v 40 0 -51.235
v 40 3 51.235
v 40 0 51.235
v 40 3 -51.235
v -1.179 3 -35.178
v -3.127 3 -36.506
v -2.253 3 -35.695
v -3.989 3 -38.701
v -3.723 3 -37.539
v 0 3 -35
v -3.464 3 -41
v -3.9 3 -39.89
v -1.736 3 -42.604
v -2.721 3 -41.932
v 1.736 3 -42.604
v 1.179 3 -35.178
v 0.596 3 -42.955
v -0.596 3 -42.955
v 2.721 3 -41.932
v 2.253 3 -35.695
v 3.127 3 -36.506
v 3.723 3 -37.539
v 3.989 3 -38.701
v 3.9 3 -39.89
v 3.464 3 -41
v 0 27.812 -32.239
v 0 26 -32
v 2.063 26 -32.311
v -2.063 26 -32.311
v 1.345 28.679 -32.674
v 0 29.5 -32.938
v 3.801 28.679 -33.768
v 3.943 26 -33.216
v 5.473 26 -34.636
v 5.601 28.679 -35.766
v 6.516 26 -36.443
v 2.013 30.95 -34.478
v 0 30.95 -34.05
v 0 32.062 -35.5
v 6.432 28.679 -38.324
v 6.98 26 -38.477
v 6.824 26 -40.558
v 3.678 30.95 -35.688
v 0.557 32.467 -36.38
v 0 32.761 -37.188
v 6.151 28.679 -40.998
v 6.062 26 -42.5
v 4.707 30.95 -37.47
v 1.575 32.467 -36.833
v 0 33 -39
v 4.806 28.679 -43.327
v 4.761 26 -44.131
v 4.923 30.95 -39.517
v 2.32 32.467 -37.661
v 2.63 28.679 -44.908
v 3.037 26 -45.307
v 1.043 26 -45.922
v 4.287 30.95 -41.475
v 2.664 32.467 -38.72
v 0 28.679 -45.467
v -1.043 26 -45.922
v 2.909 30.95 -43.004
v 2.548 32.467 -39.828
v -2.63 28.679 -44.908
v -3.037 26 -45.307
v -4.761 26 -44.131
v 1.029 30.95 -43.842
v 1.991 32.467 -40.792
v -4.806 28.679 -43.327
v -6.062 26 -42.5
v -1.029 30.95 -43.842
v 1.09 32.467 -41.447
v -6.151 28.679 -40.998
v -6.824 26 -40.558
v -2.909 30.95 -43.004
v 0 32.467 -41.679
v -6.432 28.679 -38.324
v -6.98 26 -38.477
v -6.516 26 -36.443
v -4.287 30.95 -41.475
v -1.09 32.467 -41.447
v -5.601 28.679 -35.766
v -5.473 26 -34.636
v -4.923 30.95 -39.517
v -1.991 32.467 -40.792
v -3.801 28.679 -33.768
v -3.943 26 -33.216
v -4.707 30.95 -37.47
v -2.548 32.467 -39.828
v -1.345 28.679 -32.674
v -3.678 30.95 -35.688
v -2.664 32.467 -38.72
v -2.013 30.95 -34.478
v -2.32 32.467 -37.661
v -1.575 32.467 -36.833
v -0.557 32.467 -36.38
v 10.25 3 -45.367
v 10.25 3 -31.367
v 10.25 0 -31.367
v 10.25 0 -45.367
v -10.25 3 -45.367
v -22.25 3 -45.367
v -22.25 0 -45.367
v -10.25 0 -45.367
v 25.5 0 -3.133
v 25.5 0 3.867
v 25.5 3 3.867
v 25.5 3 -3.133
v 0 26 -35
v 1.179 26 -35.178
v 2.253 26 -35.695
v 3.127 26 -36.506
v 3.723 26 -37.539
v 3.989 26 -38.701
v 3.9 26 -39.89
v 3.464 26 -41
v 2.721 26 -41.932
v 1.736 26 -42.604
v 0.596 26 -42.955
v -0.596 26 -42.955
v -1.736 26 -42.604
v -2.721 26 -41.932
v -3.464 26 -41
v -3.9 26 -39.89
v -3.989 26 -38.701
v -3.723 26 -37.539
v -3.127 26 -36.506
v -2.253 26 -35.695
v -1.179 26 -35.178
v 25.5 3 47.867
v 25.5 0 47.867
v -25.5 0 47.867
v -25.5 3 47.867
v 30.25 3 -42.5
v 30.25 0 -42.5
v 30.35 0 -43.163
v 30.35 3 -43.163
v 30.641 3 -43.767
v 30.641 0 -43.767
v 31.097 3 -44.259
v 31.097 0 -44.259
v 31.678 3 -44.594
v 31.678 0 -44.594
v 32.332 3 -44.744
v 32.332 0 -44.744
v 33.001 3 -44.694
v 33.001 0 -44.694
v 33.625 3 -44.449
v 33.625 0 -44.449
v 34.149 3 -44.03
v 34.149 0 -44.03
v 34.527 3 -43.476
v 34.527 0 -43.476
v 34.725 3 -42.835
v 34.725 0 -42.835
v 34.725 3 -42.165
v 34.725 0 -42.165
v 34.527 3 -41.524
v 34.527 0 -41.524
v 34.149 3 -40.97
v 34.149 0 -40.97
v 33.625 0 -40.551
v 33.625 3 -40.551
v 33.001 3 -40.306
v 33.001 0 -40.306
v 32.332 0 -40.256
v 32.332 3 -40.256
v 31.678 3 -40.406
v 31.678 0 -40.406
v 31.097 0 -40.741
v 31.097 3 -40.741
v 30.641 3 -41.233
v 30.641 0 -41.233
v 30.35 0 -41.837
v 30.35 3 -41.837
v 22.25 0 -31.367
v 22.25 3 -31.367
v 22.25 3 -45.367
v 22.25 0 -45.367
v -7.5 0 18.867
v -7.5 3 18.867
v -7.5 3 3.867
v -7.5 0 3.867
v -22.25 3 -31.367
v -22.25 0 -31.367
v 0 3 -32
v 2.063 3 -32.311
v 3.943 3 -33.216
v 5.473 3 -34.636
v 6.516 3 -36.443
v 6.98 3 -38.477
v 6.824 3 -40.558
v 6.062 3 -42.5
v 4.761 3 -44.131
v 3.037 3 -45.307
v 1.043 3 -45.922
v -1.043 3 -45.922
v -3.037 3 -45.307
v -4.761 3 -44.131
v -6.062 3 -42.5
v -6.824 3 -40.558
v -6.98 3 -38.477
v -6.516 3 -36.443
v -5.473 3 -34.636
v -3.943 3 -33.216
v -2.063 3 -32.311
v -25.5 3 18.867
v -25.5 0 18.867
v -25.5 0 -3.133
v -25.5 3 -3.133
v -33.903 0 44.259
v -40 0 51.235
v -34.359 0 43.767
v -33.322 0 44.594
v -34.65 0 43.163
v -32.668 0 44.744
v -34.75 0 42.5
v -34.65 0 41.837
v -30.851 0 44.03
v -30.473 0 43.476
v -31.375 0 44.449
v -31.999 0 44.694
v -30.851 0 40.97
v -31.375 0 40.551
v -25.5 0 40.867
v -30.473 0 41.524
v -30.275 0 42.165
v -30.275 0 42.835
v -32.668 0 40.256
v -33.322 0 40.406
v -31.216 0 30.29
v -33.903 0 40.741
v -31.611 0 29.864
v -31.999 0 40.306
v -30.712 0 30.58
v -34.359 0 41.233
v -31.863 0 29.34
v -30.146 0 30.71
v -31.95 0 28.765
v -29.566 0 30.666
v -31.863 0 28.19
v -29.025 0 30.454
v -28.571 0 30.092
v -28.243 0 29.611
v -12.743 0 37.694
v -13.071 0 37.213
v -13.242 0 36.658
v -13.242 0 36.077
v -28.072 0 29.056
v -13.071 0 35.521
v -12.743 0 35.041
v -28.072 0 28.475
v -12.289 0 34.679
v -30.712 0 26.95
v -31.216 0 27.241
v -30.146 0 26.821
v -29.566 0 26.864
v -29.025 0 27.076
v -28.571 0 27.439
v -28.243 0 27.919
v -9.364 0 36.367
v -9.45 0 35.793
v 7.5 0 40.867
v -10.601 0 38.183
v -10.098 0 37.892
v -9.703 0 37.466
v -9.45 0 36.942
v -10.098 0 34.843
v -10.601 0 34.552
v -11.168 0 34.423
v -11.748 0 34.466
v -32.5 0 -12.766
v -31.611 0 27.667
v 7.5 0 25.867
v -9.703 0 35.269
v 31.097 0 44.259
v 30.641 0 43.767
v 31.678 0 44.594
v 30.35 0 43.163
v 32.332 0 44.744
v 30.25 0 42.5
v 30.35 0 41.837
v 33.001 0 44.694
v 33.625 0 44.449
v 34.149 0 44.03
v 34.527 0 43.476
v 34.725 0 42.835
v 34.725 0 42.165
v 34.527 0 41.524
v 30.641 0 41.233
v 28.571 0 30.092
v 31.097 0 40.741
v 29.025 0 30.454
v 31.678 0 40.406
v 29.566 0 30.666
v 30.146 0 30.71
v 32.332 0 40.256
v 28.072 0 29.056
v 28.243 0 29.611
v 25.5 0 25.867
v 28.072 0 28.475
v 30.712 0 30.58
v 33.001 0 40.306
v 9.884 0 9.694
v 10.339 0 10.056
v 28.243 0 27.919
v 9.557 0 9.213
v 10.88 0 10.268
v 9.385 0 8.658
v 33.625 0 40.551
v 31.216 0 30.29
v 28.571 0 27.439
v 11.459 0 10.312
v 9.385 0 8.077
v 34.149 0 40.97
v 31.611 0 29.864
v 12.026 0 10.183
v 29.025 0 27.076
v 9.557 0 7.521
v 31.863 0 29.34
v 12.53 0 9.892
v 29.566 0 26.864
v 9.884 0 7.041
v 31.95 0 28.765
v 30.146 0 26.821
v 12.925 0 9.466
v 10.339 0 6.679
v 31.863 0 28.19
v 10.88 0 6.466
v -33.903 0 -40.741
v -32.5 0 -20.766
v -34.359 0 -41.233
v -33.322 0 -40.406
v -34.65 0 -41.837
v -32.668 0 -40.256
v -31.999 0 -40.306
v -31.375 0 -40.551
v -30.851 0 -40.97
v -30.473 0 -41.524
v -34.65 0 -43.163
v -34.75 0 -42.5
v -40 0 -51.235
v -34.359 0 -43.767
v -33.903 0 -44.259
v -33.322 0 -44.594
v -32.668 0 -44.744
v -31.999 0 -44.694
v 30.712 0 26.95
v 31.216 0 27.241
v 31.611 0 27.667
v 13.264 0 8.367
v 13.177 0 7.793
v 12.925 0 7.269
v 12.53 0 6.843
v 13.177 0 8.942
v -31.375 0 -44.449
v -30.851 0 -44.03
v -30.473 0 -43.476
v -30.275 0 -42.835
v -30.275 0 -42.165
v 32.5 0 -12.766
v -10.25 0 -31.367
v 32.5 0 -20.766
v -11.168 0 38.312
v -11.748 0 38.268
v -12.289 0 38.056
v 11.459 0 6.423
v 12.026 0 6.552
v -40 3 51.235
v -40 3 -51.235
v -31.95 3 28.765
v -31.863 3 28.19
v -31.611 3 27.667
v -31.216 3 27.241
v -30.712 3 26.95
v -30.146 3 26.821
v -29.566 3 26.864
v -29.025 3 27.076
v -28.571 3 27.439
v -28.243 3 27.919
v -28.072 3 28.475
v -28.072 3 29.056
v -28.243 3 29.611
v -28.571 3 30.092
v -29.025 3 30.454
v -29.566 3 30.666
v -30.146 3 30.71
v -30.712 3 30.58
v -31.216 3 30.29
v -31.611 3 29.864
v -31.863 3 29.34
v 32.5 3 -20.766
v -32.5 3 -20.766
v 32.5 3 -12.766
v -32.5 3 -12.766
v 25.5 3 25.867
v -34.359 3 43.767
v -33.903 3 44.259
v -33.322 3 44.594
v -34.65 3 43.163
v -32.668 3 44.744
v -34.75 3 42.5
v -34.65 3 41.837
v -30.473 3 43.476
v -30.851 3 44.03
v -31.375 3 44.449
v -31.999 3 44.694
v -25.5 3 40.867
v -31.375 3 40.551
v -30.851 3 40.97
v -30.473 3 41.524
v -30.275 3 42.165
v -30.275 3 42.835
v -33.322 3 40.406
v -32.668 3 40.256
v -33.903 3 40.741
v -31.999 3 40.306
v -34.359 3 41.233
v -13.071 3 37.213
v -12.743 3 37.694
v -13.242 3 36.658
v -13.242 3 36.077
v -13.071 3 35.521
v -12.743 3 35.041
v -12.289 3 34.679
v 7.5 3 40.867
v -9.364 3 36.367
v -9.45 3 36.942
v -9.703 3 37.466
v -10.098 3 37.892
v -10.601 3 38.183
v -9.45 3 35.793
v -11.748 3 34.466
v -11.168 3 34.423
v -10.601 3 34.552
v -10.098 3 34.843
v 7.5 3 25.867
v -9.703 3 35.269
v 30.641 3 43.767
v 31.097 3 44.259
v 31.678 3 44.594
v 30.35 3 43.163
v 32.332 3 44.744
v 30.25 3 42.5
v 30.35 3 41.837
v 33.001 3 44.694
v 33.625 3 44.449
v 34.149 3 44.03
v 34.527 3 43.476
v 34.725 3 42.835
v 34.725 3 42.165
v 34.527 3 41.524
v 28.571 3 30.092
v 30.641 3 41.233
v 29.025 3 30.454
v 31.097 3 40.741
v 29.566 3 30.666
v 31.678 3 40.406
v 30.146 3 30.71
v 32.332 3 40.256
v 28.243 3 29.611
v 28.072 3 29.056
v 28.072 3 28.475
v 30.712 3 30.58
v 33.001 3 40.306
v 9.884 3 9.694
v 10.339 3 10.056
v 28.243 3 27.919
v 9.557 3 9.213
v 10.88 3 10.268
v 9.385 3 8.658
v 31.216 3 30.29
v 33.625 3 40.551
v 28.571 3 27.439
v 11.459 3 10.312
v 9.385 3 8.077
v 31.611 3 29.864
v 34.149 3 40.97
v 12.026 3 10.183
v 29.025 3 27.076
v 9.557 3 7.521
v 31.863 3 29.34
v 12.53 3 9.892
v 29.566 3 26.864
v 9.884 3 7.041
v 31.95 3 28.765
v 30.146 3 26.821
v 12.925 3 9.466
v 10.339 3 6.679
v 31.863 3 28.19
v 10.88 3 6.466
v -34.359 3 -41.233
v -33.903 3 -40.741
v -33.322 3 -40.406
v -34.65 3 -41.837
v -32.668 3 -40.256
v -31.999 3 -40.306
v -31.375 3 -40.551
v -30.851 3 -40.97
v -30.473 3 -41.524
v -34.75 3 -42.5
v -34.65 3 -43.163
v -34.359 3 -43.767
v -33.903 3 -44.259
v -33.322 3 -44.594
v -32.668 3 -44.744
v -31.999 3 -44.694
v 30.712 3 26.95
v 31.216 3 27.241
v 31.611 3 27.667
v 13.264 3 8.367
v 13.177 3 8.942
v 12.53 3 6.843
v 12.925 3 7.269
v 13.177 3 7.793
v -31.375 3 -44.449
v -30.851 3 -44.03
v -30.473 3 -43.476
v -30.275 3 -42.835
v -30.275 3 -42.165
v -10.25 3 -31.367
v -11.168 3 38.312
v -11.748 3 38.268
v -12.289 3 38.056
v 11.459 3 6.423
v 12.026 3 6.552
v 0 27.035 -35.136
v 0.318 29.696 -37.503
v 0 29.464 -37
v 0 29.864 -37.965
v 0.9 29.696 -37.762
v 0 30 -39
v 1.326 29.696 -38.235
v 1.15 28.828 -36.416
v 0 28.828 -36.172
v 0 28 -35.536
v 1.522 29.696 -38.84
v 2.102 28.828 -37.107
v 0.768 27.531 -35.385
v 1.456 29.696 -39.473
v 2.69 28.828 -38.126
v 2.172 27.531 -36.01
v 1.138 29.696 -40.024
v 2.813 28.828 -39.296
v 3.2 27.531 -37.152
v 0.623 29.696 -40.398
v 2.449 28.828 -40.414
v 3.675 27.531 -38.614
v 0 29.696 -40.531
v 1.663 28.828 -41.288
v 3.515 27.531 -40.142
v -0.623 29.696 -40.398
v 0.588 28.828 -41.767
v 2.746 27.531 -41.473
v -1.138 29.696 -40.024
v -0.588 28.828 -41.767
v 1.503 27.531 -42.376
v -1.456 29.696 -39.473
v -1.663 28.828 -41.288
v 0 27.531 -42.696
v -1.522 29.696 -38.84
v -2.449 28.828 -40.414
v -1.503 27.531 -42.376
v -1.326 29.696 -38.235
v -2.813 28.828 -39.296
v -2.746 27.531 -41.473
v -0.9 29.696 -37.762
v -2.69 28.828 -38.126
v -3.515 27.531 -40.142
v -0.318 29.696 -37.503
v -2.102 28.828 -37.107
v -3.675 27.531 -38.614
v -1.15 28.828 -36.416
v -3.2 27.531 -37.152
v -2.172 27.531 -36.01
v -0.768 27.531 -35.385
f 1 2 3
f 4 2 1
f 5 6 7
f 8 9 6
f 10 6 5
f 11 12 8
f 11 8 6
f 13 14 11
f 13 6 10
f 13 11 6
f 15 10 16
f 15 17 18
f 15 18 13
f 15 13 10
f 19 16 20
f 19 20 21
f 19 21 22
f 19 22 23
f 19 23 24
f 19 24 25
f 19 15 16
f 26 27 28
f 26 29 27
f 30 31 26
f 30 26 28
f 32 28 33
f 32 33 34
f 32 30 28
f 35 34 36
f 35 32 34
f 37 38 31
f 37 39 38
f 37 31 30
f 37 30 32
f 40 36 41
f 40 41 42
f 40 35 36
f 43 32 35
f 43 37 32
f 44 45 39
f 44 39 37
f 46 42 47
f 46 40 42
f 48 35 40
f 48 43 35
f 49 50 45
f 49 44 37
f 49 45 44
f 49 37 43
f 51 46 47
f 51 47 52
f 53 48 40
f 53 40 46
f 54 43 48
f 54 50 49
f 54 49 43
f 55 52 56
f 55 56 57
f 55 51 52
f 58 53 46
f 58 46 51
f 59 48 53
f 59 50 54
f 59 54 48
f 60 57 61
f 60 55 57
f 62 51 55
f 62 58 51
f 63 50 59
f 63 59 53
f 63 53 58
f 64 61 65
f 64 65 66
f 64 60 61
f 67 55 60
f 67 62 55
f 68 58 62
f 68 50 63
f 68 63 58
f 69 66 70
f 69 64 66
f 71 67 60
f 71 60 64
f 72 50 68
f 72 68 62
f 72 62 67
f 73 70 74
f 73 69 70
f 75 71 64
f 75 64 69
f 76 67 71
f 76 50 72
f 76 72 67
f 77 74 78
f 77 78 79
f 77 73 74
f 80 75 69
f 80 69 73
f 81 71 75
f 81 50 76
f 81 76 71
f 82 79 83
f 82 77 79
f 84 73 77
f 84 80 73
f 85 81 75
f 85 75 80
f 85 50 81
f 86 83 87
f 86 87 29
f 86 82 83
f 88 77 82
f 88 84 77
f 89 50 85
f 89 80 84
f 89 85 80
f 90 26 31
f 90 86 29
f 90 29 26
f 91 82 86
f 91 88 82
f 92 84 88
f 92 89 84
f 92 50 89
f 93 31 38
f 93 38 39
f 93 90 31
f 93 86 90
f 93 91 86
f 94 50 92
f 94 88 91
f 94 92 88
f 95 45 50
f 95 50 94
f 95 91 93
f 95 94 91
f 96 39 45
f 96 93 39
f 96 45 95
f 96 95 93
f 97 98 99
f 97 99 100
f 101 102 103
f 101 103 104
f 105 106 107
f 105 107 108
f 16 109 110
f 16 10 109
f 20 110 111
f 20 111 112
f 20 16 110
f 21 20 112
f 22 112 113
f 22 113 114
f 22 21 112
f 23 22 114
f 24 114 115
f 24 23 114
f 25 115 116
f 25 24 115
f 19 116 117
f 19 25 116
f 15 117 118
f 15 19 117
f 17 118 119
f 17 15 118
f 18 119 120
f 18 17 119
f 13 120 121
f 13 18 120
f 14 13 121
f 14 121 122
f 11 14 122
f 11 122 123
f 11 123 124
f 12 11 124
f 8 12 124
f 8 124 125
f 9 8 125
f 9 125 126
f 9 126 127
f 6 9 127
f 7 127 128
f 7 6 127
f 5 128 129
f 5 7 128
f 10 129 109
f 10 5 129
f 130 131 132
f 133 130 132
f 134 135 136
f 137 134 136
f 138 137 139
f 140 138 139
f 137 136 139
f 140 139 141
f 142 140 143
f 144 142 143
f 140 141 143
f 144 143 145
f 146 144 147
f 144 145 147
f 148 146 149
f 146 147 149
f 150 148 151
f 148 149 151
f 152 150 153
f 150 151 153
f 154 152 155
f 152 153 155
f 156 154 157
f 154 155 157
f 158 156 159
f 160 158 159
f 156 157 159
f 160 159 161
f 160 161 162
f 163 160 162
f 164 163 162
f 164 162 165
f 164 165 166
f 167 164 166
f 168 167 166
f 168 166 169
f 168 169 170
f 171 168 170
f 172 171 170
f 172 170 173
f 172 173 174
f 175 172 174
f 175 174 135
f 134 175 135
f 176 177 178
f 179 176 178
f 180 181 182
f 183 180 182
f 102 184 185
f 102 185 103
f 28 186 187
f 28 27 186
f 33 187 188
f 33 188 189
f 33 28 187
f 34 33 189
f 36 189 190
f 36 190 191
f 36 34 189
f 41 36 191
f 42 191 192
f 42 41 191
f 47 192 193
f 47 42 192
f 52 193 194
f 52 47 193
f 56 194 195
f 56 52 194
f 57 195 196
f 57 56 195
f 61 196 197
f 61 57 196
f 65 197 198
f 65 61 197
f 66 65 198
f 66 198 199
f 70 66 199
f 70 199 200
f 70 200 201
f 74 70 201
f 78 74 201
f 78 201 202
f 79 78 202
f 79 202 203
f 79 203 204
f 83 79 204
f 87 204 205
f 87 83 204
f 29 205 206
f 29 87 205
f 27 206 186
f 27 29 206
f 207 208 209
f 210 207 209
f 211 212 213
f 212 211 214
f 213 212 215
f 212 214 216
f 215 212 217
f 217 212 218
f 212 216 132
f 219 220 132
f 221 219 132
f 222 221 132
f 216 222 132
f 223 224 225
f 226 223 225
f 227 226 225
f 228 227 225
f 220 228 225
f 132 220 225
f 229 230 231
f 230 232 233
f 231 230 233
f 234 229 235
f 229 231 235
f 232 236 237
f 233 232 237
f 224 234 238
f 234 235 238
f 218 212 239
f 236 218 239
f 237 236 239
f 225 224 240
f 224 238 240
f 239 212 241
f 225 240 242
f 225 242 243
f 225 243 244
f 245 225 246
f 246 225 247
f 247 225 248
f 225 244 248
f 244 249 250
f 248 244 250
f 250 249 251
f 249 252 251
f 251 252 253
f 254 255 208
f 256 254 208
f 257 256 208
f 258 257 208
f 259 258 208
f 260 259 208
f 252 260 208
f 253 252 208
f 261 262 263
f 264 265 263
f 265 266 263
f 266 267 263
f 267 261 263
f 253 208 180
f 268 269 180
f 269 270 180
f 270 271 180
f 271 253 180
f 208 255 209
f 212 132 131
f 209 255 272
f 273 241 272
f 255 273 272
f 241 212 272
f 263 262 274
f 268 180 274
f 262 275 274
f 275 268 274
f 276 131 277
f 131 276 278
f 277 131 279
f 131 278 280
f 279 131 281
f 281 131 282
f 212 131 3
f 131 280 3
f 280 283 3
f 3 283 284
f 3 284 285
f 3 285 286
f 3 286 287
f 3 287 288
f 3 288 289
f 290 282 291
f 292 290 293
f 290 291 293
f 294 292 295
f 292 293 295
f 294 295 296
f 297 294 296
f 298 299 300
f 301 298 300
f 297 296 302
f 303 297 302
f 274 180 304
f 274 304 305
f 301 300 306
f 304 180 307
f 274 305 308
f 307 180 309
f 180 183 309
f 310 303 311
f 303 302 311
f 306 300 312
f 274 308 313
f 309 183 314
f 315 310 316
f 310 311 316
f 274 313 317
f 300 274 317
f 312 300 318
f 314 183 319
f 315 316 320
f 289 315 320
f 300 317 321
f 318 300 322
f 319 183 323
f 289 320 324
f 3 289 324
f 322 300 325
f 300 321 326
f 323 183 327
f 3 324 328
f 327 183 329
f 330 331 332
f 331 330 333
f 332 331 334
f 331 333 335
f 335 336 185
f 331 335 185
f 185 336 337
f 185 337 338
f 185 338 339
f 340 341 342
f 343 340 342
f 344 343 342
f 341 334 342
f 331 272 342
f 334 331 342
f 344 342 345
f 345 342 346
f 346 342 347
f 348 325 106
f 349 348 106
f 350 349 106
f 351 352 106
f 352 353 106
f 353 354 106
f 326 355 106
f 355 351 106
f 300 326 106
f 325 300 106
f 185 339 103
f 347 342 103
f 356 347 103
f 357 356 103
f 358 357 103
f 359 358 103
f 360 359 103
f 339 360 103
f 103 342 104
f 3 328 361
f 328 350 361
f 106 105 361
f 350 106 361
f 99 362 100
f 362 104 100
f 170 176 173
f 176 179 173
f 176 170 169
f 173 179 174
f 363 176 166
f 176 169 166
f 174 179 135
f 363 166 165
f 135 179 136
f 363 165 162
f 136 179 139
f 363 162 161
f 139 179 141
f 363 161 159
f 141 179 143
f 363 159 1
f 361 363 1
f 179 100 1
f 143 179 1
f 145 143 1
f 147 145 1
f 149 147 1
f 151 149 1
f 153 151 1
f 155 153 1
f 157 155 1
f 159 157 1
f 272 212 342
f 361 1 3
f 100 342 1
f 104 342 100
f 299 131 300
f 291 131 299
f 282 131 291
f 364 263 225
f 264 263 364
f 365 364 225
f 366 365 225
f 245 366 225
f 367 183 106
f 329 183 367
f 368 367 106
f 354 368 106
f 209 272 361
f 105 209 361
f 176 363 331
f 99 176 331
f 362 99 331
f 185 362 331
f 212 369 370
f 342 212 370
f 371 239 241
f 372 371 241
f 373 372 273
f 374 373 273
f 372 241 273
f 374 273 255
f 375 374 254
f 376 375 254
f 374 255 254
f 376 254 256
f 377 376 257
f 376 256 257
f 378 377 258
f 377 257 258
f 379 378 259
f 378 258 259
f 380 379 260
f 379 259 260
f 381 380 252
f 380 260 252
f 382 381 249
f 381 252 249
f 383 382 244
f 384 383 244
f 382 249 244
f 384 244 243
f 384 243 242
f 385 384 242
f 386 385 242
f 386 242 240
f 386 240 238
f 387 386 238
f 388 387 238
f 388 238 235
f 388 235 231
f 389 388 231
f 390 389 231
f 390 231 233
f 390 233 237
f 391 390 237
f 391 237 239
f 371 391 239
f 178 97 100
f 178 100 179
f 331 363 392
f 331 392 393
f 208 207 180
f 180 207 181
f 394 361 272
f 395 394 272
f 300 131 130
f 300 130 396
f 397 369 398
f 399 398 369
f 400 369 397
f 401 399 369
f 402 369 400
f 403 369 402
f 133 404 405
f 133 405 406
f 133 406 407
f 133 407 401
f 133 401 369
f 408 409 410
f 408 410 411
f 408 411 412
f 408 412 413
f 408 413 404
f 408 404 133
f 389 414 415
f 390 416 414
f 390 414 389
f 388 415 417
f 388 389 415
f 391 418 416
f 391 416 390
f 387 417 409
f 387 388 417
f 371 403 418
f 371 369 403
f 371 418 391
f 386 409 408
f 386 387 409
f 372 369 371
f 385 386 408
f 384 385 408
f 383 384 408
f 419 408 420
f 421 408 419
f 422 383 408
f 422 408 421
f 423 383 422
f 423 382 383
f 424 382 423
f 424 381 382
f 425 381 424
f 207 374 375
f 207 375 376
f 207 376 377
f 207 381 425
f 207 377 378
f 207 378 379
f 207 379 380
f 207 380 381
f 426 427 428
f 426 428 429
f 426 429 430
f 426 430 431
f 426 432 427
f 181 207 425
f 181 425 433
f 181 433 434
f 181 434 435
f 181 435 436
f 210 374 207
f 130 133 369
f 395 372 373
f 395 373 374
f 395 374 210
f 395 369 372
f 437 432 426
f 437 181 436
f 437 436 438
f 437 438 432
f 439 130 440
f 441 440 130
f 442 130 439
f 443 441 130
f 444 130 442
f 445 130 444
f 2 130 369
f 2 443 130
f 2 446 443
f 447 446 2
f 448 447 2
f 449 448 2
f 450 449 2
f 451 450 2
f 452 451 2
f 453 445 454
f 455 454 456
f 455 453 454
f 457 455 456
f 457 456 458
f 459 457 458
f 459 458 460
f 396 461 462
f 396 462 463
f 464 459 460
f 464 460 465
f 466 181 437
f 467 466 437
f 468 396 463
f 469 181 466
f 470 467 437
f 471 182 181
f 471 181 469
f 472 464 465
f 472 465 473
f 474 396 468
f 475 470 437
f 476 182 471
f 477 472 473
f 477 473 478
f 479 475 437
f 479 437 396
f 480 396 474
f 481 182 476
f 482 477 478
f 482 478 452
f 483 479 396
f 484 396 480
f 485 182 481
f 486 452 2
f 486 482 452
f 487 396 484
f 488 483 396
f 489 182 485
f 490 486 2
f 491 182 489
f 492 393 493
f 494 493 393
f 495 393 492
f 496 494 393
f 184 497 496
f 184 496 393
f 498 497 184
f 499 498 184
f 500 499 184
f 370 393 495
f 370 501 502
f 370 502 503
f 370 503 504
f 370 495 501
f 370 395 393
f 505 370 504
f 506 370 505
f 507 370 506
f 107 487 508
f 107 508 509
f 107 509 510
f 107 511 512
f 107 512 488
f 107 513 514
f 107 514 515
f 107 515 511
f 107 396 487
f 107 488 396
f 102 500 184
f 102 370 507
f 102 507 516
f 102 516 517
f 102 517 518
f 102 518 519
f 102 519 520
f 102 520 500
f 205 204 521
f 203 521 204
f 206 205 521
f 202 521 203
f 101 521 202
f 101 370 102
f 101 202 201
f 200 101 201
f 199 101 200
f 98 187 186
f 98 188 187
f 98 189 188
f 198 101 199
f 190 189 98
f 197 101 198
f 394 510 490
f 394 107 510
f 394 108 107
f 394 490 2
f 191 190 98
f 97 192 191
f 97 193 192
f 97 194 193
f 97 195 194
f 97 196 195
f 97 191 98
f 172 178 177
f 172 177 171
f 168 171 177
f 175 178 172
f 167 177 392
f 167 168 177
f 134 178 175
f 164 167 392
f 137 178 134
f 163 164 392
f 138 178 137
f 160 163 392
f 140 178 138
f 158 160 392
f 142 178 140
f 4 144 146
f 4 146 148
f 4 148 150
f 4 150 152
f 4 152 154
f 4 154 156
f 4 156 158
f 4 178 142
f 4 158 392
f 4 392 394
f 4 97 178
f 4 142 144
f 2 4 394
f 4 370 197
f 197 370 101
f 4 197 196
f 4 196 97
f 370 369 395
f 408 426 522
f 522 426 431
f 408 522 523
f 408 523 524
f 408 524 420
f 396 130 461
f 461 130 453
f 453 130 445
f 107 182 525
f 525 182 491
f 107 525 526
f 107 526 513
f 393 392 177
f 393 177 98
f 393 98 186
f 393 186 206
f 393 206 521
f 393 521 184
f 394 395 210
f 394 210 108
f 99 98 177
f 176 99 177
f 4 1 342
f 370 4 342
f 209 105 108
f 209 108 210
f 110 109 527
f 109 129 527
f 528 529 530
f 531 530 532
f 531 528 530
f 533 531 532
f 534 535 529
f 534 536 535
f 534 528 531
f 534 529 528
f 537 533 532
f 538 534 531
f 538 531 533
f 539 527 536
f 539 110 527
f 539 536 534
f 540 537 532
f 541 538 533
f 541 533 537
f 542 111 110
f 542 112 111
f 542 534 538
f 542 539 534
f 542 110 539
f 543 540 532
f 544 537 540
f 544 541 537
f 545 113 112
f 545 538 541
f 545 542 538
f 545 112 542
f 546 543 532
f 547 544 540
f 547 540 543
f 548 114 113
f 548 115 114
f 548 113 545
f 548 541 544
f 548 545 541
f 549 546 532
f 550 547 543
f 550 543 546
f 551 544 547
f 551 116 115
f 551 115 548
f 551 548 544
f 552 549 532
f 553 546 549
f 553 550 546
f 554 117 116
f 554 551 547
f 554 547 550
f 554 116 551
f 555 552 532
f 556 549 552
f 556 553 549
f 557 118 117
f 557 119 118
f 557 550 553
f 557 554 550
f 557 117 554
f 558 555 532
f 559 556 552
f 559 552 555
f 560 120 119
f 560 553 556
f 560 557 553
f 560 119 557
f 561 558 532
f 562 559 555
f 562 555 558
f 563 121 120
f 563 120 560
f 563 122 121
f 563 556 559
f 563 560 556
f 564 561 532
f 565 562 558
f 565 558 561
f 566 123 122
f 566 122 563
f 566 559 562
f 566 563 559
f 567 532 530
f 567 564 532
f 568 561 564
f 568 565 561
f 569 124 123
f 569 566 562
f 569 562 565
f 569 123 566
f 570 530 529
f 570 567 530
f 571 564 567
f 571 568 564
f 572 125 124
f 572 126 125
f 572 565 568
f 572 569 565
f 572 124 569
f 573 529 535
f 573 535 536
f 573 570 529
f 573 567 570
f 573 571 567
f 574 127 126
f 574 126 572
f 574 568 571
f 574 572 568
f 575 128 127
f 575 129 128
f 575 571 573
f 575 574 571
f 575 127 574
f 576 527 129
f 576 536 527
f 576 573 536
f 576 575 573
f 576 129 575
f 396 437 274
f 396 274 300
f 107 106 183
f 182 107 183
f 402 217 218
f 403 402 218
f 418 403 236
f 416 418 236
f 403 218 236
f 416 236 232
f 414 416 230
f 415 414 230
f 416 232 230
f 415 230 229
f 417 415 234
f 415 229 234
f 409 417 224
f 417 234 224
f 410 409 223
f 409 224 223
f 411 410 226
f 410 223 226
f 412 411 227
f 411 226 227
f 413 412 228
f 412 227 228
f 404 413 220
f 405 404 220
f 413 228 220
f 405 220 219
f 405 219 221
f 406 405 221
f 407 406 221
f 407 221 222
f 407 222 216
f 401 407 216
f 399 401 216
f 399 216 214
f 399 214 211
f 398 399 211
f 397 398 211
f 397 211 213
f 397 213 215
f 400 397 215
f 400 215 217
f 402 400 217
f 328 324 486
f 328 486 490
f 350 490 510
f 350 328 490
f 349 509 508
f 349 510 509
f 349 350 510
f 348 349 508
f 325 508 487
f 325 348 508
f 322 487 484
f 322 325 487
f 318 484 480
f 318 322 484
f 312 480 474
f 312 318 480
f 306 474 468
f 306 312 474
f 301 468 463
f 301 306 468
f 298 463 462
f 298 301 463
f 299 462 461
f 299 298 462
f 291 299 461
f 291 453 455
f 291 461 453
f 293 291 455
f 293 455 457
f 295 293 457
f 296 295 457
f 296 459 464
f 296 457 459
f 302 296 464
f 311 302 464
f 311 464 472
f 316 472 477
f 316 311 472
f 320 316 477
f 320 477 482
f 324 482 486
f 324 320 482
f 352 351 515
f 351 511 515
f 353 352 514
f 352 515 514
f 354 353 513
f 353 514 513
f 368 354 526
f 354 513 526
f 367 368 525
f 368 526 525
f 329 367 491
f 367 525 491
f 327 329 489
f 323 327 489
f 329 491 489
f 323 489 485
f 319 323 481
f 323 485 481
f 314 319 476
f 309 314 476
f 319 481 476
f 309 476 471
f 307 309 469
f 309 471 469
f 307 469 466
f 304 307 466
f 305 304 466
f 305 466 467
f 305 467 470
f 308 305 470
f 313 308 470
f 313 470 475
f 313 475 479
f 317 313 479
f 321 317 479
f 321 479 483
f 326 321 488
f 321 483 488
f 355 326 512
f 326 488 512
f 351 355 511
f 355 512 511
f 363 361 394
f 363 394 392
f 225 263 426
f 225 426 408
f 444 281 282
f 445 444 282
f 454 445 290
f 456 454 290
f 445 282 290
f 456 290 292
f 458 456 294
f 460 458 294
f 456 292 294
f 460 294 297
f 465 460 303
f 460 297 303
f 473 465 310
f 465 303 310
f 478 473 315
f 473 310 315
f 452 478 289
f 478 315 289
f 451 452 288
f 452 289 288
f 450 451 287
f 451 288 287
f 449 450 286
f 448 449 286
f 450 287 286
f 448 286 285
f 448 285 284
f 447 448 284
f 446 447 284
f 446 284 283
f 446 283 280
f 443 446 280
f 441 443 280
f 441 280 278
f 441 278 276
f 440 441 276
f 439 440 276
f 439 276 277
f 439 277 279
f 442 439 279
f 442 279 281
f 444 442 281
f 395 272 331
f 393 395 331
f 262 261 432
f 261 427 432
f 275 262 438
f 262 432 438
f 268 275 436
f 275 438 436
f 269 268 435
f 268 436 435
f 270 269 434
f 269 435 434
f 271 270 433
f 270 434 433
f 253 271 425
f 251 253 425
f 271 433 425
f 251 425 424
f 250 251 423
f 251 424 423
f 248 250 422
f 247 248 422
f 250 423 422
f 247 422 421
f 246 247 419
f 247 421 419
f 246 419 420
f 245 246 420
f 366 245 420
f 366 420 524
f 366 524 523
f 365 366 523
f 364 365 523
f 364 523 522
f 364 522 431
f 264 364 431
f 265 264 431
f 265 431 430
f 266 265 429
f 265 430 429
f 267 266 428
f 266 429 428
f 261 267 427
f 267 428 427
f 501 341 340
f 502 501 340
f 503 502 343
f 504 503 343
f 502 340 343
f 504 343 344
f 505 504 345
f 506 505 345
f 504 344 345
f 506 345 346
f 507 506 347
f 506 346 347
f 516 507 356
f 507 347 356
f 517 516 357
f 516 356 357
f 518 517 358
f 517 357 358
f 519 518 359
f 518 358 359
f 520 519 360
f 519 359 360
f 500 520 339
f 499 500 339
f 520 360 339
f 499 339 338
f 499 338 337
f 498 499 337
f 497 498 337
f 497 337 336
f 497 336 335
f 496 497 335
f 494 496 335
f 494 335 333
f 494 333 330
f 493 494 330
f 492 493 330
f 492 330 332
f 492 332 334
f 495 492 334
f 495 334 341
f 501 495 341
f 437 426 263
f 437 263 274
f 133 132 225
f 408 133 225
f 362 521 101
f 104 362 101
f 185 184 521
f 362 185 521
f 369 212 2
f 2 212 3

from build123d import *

# Parameters (mm, degrees)
ESQUISSE1_R             = 65
DISQUE_DEPTH            = 3
ESQUISSE3_W             = 30.466369815
ESQUISSE3_H             = 200
COT_S_DEPTH             = 4
D_GAGEMENT_M3_52_D      = 3.9
D_GAGEMENT_M42_D        = 4.5
ESQUISSE15_W            = 89.863216067
ESQUISSE15_H            = 32.096215679
ENL_V_MAT_EXTRU_1_DEPTH = 34
D_GAGEMENT_M3_53_D      = 3.9
D_GAGEMENT_M3_53_DEPTH  = 3
D_GAGEMENT_M3_53_TIP    = 1.171678207
ESQUISSE22_W            = 113.248519978
ESQUISSE22_H            = 34.612898142
ESQUISSE22_W_2          = 51
ESQUISSE22_H_2          = 7
ESQUISSE22_W_3          = 65
ESQUISSE22_H_3          = 8
ENL_V_MAT_EXTRU_3_DEPTH = 10
ESQUISSE23_W            = 12
ESQUISSE23_H            = 14
ENL_V_MAT_EXTRU_4_DEPTH = 10
ESQUISSE24_W            = 18
ESQUISSE24_H            = 15
ENL_V_MAT_EXTRU_5_DEPTH = 10


with BuildPart() as part:
    # Esquisse1 → disque (new body)
    with BuildSketch(Plane(origin=(0, 0, 0), x_dir=(1, 0, 0), z_dir=(0, 1, 0))):
        Circle(ESQUISSE1_R)
    extrude(amount=DISQUE_DEPTH)

    # Esquisse3 → cotés (cut, through all)
    with BuildSketch(Plane(origin=(0, 3, 0), x_dir=(1, 0, 0), z_dir=(0, 1, 0))):
        with Locations((-55.233184908, 0)):
            Rectangle(ESQUISSE3_W, ESQUISSE3_H)
        with Locations((55.233184908, 0)):
            Rectangle(ESQUISSE3_W, ESQUISSE3_H)
    extrude(amount=-COT_S_DEPTH, mode=Mode.SUBTRACT)

    # Dégagement M3.52 (through all)
    with Locations(Plane(origin=(0, 3, 0), x_dir=(1, 0, 0), z_dir=(0, 1, 0))):
        with Locations((-30, -28.76524617)):
            d_gagement_m3_52 = Hole(D_GAGEMENT_M3_52_D / 2)

    # Symétrie1: Dégagement M3.52 across plane
    add(d_gagement_m3_52.mirror(Plane.ZY), mode=Mode.SUBTRACT)

    # Dégagement M42 (through all)
    with Locations(Plane(origin=(0, 3, 0), x_dir=(1, 0, 0), z_dir=(0, 1, 0))):
        with Locations((-32.5, 42.5), (32.5, 42.5), (32.5, -42.5), (-32.5, -42.5)):
            Hole(D_GAGEMENT_M42_D / 2)

    # Esquisse14 → Révolution1 (revolve)
    with BuildSketch(Plane.ZY):
        with BuildLine():
            Line((-35, 3), (-32, 3))
            Line((-32, 3), (-32, 26))
            ThreePointArc((-32, 26), (-34.050252532, 30.949747468), (-39, 33))
            Line((-39, 33), (-39, 30))
            ThreePointArc((-39, 30), (-36.171572875, 28.828427125), (-35, 26))
            Line((-35, 26), (-35, 3))
        make_face()
    revolve(axis=Axis((0, 3, -39), (0, 1, 0)))

    # Esquisse15 → Enlèv. mat.-Extru.1 (cut, through all)
    with BuildSketch(Plane.XZ):
        with Locations((-4.931608034, 67.282861669)):
            Rectangle(ESQUISSE15_W, ESQUISSE15_H)
    extrude(amount=-ENL_V_MAT_EXTRU_1_DEPTH, mode=Mode.SUBTRACT)

    # Dégagement M3.53
    with Locations(Plane(origin=(0, 0, 0), x_dir=(-1, 0, 0), z_dir=(0, -1, 0))):
        with Locations((-11.313708499, -8.367376915), (11.313708499, -36.367376915)):
            Hole(D_GAGEMENT_M3_53_D / 2, depth=D_GAGEMENT_M3_53_DEPTH)
            with Locations((0, 0, -(D_GAGEMENT_M3_53_DEPTH + D_GAGEMENT_M3_53_TIP / 2))):  # 118° drill point
                Cone(0, D_GAGEMENT_M3_53_D / 2, D_GAGEMENT_M3_53_TIP, mode=Mode.SUBTRACT)

    # Esquisse22 → Enlèv. mat.-Extru.3 (cut)
    with BuildSketch(Plane(origin=(0, 0, 0), x_dir=(-1, 0, 0), z_dir=(0, -1, 0))):
        with Locations((16.624259989, 68.541202901)):
            Rectangle(ESQUISSE22_W, ESQUISSE22_H)
        with Locations((0, -0.367376915)):
            Rectangle(ESQUISSE22_W_2, ESQUISSE22_H_2)
        with Locations((0, -44.367376915)):
            Rectangle(ESQUISSE22_W_2, ESQUISSE22_H_2)
        with Locations((0, 16.766315781)):
            Rectangle(ESQUISSE22_W_3, ESQUISSE22_H_3)
    extrude(amount=-ENL_V_MAT_EXTRU_3_DEPTH, mode=Mode.SUBTRACT)

    # Esquisse23 → Enlèv. mat.-Extru.4 (cut)
    with BuildSketch(Plane(origin=(0, 3, 0), x_dir=(1, 0, 0), z_dir=(0, 1, 0))):
        with Locations((-16.25, 38.367376915)):
            Rectangle(ESQUISSE23_W, ESQUISSE23_H)
        with Locations((16.25, 38.367376915)):
            Rectangle(ESQUISSE23_W, ESQUISSE23_H)
    extrude(amount=-ENL_V_MAT_EXTRU_4_DEPTH, mode=Mode.SUBTRACT)

    # Esquisse24 → Enlèv. mat.-Extru.5 (cut)
    with BuildSketch(Plane(origin=(0, 3, 0), x_dir=(1, 0, 0), z_dir=(0, 1, 0))):
        with Locations((-16.5, -11.367376915)):
            Rectangle(ESQUISSE24_W, ESQUISSE24_H)
        with Locations((16.5, -33.367376915)):
            Rectangle(ESQUISSE24_W, ESQUISSE24_H)
    extrude(amount=-ENL_V_MAT_EXTRU_5_DEPTH, mode=Mode.SUBTRACT)


solid = part.part
